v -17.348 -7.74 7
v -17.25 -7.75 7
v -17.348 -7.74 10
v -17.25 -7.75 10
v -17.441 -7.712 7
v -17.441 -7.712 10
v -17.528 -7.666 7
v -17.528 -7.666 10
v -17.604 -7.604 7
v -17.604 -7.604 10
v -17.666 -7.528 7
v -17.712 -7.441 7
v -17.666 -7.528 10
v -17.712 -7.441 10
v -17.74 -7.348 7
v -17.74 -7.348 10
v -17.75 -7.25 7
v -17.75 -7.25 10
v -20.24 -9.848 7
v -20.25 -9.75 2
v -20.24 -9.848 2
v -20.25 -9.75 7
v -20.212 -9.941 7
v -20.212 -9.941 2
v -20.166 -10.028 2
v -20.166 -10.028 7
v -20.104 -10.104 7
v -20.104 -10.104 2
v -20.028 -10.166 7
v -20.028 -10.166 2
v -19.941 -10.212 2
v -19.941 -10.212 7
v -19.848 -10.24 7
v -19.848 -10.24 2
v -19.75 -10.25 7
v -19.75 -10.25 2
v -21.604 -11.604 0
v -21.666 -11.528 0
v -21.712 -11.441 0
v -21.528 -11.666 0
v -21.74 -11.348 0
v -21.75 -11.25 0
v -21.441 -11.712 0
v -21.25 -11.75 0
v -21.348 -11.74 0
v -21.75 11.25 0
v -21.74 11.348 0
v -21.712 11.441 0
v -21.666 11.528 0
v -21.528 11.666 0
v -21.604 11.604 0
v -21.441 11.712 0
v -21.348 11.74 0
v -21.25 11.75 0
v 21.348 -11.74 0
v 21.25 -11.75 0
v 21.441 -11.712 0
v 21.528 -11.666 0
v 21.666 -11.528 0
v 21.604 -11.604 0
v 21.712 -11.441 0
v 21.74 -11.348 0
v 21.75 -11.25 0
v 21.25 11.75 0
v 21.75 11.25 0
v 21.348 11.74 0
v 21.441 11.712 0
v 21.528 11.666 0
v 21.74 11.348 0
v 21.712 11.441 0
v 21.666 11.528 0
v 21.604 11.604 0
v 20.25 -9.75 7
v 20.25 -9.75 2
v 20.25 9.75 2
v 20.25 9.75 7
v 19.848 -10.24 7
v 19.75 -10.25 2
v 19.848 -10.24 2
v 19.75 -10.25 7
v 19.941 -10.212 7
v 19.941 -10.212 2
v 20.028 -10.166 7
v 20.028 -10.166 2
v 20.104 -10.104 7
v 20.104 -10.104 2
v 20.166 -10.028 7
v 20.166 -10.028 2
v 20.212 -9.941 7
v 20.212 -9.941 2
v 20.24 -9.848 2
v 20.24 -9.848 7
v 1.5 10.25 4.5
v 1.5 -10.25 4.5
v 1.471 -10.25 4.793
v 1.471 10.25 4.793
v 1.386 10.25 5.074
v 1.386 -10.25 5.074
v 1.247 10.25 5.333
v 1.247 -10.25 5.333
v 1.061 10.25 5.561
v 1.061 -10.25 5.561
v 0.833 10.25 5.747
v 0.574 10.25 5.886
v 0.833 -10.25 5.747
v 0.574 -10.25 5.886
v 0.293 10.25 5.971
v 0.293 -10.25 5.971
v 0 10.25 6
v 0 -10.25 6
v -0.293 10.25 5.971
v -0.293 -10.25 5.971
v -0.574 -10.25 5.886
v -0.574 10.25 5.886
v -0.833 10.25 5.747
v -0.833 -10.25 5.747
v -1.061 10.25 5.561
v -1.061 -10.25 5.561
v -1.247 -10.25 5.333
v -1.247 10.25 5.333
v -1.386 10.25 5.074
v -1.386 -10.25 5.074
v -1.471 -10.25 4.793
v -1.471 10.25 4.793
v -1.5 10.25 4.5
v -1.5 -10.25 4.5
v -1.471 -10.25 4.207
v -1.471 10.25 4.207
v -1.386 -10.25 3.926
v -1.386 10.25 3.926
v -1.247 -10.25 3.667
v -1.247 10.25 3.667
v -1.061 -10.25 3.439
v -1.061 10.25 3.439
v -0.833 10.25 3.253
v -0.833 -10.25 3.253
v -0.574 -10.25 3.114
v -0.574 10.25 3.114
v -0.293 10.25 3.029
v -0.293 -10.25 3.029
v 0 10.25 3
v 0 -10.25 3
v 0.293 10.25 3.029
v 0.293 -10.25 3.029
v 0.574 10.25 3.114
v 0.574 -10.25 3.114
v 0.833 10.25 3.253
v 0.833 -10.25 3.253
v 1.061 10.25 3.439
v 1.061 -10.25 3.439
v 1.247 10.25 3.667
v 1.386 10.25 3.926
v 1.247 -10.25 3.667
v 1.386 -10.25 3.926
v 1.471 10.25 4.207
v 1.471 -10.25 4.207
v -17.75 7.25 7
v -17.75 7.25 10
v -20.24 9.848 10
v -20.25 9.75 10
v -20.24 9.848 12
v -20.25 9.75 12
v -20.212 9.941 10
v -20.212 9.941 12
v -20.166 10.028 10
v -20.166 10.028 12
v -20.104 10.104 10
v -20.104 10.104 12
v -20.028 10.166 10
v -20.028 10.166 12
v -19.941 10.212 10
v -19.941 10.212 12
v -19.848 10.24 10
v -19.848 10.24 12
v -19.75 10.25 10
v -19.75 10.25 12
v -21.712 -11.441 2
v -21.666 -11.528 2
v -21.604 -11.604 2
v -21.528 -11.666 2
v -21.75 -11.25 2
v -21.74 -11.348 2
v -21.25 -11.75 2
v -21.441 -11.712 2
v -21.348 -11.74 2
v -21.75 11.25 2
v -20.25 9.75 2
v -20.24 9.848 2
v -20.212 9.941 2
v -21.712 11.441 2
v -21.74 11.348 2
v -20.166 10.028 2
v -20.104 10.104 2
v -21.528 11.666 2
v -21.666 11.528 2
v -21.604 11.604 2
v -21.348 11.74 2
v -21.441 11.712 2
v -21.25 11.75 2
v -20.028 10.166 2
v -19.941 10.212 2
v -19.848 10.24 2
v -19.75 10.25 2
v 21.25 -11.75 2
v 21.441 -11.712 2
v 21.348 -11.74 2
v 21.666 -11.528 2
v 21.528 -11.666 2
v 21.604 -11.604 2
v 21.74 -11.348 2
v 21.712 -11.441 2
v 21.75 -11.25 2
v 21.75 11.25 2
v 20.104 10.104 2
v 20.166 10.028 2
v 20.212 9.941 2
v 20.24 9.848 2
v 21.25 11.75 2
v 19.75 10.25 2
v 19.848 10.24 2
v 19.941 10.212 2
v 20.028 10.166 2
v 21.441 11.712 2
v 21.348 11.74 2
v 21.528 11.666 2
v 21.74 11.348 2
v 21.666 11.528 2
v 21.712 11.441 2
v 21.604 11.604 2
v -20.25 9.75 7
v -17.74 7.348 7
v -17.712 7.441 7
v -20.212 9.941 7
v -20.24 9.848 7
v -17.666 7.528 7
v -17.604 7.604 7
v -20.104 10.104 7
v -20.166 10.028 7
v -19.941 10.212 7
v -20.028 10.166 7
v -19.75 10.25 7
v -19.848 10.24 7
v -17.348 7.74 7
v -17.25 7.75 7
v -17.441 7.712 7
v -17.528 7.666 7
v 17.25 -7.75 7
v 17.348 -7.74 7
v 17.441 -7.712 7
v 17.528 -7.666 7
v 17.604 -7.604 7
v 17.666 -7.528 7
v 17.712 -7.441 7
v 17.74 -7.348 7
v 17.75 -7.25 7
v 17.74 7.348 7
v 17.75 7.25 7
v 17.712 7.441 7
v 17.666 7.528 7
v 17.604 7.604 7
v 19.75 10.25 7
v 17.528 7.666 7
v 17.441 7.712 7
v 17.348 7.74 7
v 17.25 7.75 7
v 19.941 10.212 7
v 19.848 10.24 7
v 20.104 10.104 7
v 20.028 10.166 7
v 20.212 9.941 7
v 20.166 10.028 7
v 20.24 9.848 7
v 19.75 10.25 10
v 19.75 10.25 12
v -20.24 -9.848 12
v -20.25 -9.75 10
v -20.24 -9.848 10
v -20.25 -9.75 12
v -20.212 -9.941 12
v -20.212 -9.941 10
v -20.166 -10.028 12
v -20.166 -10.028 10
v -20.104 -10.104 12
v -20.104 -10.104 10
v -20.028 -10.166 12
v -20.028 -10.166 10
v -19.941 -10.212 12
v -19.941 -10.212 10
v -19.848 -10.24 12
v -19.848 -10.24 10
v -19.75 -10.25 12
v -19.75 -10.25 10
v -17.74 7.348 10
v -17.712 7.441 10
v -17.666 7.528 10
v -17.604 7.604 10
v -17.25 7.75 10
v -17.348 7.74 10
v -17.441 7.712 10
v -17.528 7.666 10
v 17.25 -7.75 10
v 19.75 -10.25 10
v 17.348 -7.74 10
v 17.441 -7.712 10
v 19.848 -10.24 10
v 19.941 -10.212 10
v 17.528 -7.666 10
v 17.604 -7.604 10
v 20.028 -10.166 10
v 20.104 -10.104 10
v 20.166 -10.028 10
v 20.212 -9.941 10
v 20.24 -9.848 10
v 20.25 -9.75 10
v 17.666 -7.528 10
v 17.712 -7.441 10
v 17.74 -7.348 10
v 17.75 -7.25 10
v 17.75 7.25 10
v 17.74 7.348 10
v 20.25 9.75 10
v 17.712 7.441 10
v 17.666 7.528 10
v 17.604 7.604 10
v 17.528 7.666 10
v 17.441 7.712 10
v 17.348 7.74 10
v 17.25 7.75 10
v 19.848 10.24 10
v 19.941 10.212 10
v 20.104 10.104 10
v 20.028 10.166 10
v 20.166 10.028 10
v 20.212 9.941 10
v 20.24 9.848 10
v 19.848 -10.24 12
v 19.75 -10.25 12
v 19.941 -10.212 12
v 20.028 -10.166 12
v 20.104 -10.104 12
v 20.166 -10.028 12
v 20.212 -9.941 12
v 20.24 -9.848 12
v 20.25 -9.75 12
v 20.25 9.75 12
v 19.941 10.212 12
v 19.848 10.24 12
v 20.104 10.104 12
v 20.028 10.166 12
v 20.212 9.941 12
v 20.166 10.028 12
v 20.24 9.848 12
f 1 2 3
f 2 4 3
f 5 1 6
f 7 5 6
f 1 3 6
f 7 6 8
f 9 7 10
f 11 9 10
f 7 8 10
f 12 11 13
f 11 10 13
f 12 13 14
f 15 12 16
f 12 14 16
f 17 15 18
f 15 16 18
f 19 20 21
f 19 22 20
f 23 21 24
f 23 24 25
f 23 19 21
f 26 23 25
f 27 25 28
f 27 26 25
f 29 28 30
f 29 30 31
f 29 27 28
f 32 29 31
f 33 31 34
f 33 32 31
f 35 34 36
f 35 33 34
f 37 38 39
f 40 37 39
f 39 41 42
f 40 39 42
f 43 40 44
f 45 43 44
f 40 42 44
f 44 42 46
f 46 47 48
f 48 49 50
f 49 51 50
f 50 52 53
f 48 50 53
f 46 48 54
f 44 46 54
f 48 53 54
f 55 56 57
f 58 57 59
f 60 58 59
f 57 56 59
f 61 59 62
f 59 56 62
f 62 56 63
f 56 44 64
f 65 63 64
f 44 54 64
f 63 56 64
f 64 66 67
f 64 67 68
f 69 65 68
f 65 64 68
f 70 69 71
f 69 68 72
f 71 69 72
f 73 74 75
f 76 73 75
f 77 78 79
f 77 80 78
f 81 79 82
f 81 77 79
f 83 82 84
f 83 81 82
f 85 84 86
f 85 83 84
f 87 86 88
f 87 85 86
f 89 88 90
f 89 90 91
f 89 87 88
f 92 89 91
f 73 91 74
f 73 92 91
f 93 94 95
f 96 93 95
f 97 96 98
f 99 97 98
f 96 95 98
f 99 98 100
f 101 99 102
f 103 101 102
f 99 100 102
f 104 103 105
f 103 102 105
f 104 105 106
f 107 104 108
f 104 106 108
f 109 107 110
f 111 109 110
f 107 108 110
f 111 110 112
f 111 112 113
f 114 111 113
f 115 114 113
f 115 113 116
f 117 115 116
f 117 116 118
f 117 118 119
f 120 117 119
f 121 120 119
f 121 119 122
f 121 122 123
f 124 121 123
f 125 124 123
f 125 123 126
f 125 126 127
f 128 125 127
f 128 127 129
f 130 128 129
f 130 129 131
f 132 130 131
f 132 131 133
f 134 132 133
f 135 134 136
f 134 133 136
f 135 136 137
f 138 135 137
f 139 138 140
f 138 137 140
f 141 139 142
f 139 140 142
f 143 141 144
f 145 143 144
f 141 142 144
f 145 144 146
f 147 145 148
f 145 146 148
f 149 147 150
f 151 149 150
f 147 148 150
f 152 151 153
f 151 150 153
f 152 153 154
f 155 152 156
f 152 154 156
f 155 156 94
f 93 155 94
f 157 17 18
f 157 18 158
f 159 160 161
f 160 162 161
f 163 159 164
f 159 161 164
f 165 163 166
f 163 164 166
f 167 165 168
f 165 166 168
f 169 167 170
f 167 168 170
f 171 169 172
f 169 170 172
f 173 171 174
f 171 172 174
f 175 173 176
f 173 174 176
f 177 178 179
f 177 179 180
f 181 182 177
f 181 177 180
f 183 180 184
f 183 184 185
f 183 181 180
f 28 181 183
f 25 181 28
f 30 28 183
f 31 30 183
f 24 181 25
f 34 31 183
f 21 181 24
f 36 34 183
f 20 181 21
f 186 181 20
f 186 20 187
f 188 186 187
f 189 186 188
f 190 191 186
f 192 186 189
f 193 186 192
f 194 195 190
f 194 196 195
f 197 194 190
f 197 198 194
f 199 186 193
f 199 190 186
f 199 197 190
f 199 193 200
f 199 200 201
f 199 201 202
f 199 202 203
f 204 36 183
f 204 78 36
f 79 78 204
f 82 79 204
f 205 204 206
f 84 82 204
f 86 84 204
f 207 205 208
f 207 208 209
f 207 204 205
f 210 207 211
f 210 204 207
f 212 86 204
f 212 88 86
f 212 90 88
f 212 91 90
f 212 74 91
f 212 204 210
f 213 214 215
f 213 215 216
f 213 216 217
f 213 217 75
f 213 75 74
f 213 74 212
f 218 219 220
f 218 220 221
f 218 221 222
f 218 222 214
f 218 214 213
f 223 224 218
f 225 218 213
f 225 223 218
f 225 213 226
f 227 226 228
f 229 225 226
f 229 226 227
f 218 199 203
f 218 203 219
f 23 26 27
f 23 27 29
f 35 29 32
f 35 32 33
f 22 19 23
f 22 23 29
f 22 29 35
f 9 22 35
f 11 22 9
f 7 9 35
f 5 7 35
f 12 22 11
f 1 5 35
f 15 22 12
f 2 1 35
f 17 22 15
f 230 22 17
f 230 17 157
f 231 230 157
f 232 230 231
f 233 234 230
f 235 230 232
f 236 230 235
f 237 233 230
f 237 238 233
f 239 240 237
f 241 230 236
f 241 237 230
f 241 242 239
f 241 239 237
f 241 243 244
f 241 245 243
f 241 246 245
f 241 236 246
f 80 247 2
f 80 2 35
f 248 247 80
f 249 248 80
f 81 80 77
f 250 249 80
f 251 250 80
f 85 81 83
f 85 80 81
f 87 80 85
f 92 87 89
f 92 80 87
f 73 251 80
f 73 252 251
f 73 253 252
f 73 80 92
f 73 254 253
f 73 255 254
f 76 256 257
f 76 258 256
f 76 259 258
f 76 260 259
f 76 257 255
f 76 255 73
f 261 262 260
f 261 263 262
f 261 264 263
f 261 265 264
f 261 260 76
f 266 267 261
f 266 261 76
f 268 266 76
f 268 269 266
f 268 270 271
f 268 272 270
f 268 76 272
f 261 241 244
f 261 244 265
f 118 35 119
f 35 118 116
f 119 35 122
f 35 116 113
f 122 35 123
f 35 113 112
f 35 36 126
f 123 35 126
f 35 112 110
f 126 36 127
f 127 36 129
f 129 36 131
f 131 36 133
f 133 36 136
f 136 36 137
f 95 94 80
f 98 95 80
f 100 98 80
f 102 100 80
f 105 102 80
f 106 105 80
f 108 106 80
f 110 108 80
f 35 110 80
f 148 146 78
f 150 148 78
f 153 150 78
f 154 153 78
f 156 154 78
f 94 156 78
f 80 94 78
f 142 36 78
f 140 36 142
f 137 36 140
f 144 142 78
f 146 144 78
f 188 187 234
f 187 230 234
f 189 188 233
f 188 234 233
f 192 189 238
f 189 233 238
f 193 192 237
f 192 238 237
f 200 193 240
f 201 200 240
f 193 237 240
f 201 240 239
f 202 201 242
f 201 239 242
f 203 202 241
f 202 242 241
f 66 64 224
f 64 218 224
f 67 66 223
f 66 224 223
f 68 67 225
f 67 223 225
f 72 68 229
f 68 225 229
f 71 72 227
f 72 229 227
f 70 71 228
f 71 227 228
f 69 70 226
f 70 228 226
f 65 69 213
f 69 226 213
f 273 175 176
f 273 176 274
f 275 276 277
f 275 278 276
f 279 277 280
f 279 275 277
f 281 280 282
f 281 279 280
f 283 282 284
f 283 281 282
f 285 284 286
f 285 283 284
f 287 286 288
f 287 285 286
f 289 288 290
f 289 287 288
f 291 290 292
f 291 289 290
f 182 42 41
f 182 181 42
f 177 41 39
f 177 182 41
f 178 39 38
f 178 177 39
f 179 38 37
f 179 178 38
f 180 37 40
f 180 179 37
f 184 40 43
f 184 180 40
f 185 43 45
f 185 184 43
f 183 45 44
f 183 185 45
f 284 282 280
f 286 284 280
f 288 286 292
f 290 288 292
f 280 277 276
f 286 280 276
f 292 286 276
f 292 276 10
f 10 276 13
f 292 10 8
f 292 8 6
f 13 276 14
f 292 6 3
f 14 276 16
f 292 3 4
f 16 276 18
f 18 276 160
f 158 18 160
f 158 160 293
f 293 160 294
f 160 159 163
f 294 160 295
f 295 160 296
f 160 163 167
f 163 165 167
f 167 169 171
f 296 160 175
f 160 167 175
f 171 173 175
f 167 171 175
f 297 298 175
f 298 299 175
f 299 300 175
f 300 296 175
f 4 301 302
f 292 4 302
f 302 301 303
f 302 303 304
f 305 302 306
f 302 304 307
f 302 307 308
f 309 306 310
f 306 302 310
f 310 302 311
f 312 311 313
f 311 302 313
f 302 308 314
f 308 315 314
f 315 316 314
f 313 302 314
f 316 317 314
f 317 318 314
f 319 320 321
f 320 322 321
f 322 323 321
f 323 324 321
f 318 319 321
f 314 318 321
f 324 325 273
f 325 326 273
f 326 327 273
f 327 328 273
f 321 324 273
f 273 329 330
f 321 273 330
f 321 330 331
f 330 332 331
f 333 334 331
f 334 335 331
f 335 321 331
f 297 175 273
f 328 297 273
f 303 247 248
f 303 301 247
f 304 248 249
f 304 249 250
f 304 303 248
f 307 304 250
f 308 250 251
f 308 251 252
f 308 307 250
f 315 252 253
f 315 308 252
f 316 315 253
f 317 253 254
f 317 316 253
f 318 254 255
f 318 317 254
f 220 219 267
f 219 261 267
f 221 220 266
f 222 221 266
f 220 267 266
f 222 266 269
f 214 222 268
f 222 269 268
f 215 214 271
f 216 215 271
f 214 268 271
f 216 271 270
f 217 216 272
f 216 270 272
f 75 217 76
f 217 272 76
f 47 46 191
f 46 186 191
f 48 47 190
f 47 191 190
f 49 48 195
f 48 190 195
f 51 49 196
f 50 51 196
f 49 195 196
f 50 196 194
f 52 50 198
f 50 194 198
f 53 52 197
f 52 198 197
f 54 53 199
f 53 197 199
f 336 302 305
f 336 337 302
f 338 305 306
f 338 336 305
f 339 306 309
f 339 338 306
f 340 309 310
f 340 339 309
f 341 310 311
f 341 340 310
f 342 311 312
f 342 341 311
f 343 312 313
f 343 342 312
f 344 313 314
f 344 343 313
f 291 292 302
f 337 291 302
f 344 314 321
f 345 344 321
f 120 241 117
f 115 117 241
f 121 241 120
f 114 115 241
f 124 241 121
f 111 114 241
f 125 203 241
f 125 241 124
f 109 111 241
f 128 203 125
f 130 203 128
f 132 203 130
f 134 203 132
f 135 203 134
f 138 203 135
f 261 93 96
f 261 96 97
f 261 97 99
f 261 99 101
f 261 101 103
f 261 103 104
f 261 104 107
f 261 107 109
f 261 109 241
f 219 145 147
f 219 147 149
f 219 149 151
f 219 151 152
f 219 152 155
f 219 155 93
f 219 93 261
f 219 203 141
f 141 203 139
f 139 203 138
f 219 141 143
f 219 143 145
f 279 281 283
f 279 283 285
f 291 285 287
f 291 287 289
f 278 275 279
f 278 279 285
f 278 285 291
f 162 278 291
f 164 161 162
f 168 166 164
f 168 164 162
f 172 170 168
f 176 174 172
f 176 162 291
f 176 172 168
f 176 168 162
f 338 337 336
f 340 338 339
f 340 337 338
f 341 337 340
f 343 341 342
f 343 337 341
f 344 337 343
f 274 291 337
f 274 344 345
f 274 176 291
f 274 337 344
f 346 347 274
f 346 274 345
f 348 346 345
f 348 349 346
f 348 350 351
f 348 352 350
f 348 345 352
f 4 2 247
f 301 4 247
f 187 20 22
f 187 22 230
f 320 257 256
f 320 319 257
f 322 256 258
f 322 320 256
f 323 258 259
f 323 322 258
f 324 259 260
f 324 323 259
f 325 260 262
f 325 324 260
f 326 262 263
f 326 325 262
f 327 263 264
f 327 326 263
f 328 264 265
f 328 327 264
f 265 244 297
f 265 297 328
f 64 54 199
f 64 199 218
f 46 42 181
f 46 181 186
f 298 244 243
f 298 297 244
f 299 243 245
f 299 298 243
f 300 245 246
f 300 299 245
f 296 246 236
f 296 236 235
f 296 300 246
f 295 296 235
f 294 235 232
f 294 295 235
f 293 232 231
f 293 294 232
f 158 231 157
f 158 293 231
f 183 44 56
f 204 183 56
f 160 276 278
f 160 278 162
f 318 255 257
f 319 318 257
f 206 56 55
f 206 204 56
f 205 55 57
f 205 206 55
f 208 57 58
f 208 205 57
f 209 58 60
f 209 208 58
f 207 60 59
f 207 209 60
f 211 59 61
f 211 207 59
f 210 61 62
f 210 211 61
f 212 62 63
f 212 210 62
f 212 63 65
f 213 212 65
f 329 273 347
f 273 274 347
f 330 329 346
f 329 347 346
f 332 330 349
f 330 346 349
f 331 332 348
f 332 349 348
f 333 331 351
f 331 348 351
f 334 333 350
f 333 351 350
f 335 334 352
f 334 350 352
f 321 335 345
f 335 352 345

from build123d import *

# Parameters (mm, degrees)
F0_W      = 43.5
F0_H      = 23.5
F1_DEPTH  = 2
F2_W      = 40.5
F2_H      = 20.5
F3_DEPTH  = 5
F4_W      = 35.5
F4_H      = 15.5
F5_DEPTH  = 3
F6_W      = 40.5
F6_H      = 20.5
F7_DEPTH  = 2
F8_R      = 0.5
F9_R      = 1.5
F10_DEPTH = 25


with BuildPart() as f1:
    # F0 (on Top) → F1 (new body)
    with BuildSketch(Plane.XY):
        Rectangle(F0_W, F0_H)
    extrude(amount=F1_DEPTH)

    # F2 (on face) → F3 (join)
    with BuildSketch(Plane.XY.offset(2)):
        Rectangle(F2_W, F2_H)
    extrude(amount=F3_DEPTH)

    # F4 (on face) → F5 (join)
    with BuildSketch(Plane.XY.offset(7)):
        Rectangle(F4_W, F4_H)
    extrude(amount=F5_DEPTH)

    # F6 (on face) → F7 (join)
    with BuildSketch(Plane.XY.offset(10)):
        Rectangle(F6_W, F6_H)
    extrude(amount=F7_DEPTH)

    # F8
    f8_edges = [f1.edges().sort_by_distance(p)[0] for p in [
        (-20.25, 10.25, 4.5),
        (-17.75, 7.75, 8.5),
        (-20.25, 10.25, 11),
        (-20.25, -10.25, 4.5),
        (-17.75, -7.75, 8.5),
        (-20.25, -10.25, 11),
        (20.25, -10.25, 4.5),
        (17.75, -7.75, 8.5),
        (20.25, -10.25, 11),
        (20.25, 10.25, 4.5),
        (17.75, 7.75, 8.5),
        (20.25, 10.25, 11),
        (21.75, -11.75, 1),
        (21.75, 11.75, 1),
        (-21.75, -11.75, 1),
        (-21.75, 11.75, 1),
    ]]
    fillet(f8_edges, radius=F8_R)

    # F9 (on face) → F10 (cut)
    with BuildSketch(Plane.XZ.offset(10.25)):
        with Locations((0, 4.5)):
            Circle(F9_R)
    extrude(amount=-F10_DEPTH, mode=Mode.SUBTRACT)


solid = f1.part
